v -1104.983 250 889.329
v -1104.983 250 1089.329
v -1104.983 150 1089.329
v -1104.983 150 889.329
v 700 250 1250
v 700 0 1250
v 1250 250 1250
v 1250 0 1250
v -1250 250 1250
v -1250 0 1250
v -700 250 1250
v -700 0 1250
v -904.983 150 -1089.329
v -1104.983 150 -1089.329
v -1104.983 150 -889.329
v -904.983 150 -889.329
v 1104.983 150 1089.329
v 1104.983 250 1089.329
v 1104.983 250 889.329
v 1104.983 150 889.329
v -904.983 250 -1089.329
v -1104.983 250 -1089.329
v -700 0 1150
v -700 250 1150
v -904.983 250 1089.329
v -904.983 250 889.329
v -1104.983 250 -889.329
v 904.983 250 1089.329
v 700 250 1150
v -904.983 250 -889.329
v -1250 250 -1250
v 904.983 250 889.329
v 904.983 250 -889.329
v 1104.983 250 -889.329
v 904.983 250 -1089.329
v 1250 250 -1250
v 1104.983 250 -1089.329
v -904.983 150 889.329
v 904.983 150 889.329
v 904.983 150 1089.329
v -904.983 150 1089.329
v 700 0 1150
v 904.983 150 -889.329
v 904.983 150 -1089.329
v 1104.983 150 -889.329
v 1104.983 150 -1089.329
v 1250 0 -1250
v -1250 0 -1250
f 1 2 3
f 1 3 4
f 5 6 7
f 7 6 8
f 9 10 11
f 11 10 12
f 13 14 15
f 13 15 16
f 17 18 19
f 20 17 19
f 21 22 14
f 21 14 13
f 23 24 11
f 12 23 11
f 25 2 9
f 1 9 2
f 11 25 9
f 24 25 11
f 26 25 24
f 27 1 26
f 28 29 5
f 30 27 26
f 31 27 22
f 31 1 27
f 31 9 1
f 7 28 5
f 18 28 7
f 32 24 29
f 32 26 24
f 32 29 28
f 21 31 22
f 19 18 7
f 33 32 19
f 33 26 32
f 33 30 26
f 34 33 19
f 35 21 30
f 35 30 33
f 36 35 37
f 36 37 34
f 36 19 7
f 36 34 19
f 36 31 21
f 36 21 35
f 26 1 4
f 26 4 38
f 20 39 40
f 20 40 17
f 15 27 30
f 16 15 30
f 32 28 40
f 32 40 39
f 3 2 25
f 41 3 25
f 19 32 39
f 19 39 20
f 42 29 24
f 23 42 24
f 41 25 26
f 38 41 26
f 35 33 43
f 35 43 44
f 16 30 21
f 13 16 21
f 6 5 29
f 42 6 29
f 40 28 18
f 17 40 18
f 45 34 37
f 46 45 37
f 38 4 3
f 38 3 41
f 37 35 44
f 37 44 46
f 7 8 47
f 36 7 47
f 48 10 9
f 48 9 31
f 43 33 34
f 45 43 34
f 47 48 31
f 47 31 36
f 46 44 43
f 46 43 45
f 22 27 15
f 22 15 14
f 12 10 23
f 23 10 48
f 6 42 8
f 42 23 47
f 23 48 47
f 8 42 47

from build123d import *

# Parameters (mm, degrees)
SKETCH_1_W          = 2500
SKETCH_1_H          = 2500
EXTRUDE_2_DEPTH     = 250
SKETCH_5_W          = 200
SKETCH_5_H          = 200
CUT_EXTRUDE_1_DEPTH = 100
SKETCH_6_W          = 200
SKETCH_6_H          = 200
CUT_EXTRUDE_2_DEPTH = 100
SKETCH_7_W          = 200
SKETCH_7_H          = 200
CUT_EXTRUDE_3_DEPTH = 100
CUT_EXTRUDE_4_DEPTH = 250


with BuildPart() as part:
    # 草图1 → 凸台-拉伸2 (new body)
    with BuildSketch(Plane(origin=(-338.184367894, 0, 1455.407434641), x_dir=(1, 0, 0), z_dir=(0, 1, 0))):
        with Locations((338.184367894, 1455.407434641)):
            Rectangle(SKETCH_1_W, SKETCH_1_H)
    extrude(amount=EXTRUDE_2_DEPTH)

    # 草图5 → 切除-拉伸1 (cut)
    with BuildSketch(Plane(origin=(0, 250, 0), x_dir=(1, 0, 0), z_dir=(0, 1, 0))):
        with Locations((1004.982787162, -989.328544112)):
            Rectangle(SKETCH_5_W, SKETCH_5_H)
    extrude(amount=-CUT_EXTRUDE_1_DEPTH, mode=Mode.SUBTRACT)

    # 草图6 → 切除-拉伸2 (cut)
    with BuildSketch(Plane(origin=(0, 250, 0), x_dir=(1, 0, 0), z_dir=(0, 1, 0))):
        with Locations((1004.982787162, 989.328544112)):
            Rectangle(SKETCH_6_W, SKETCH_6_H)
    extrude(amount=-CUT_EXTRUDE_2_DEPTH, mode=Mode.SUBTRACT)

    # 草图7 → 切除-拉伸3 (cut)
    with BuildSketch(Plane(origin=(0, 250, 0), x_dir=(1, 0, 0), z_dir=(0, 1, 0))):
        with Locations((1004.982787162, 989.328544112)):
            Rectangle(SKETCH_7_W, SKETCH_7_H)
        with Locations((1004.982787162, -989.328544112)):
            Rectangle(SKETCH_7_W, SKETCH_7_H)
        with Locations((-1004.982787162, -989.328544112)):
            Rectangle(SKETCH_7_W, SKETCH_7_H)
        with Locations((-1004.982787162, 989.328544112)):
            Rectangle(SKETCH_7_W, SKETCH_7_H)
    extrude(amount=-CUT_EXTRUDE_3_DEPTH, mode=Mode.SUBTRACT)

    # 草图9 → 切除-拉伸4 (cut)
    with BuildSketch(Plane(origin=(0, 250, 0), x_dir=(1, 0, 0), z_dir=(0, 1, 0))):
        Polygon((-700, -1250), (700, -1250), (700, -1150), (0, -1150), (-700, -1150), align=None)
    extrude(amount=-CUT_EXTRUDE_4_DEPTH, mode=Mode.SUBTRACT)


solid = part.part
